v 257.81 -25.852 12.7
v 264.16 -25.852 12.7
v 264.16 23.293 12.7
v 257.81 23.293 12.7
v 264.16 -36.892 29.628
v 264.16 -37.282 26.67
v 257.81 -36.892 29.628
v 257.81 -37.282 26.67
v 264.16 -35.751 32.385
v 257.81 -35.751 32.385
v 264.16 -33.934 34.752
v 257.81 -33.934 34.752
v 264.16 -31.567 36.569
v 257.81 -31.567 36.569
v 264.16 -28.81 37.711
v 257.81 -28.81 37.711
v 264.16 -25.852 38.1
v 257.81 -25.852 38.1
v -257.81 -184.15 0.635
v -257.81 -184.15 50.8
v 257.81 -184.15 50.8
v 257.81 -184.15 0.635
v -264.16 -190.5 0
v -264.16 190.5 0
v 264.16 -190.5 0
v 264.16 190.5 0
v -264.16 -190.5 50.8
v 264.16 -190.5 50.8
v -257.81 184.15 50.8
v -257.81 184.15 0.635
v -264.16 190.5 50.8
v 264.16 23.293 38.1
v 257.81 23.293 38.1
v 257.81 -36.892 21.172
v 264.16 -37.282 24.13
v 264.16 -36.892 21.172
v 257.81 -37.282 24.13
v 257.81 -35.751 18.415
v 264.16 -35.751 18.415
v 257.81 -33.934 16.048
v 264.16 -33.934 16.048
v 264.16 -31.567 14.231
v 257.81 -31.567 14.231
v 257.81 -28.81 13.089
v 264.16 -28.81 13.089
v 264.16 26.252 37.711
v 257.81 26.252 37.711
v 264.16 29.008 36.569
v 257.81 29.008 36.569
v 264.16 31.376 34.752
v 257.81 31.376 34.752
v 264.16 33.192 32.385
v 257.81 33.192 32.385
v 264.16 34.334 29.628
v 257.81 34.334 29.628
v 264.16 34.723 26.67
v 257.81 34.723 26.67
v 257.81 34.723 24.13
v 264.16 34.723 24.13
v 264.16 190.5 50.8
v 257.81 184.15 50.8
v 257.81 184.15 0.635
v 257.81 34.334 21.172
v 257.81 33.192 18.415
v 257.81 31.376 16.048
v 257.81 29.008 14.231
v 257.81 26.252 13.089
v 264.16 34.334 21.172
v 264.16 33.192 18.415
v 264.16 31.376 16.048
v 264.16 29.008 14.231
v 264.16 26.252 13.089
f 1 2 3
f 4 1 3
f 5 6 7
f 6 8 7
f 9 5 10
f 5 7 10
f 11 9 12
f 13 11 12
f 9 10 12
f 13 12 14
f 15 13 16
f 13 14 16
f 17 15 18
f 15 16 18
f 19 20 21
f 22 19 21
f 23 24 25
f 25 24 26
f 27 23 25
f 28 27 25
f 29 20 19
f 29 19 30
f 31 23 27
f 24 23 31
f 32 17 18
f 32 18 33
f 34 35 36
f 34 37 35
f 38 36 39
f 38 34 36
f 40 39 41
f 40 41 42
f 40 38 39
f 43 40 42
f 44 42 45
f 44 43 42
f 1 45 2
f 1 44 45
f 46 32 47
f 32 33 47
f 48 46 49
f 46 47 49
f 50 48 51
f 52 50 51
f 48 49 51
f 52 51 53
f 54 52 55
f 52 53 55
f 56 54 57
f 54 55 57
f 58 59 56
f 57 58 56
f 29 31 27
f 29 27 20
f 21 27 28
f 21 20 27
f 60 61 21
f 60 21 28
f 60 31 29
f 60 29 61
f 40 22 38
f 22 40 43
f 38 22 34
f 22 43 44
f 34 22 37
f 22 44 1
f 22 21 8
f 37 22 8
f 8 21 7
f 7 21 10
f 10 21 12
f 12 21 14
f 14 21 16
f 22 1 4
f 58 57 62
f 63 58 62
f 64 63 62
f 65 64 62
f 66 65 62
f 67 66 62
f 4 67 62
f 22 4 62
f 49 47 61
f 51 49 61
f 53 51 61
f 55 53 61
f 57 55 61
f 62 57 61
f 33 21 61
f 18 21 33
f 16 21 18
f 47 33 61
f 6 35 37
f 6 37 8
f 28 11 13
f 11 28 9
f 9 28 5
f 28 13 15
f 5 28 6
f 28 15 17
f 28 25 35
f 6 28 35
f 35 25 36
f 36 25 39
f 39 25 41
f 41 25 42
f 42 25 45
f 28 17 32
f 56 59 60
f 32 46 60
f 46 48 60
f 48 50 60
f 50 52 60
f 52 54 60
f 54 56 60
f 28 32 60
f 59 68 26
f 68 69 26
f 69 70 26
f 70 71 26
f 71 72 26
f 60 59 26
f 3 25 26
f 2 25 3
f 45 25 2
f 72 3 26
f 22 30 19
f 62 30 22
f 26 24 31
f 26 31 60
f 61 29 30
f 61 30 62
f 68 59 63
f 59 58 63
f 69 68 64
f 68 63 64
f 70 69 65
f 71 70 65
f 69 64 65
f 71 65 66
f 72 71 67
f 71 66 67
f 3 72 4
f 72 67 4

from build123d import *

# Parameters (mm, degrees)
F0_W     = 528.32
F0_H     = 381
F1_DEPTH = 50.8
F2_W     = 515.62
F2_H     = 368.3
F3_DEPTH = 50.165
F4_W     = 72.005392
F4_H     = 25.4
F5_DEPTH = 6.35
F6_R     = 11.43


with BuildPart() as f1:
    # F0 (on Top) → F1 (new body)
    with BuildSketch(Plane.XY):
        Rectangle(F0_W, F0_H)
    extrude(amount=F1_DEPTH)

    # F2 (on face) → F3 (cut)
    with BuildSketch(Plane.XY.offset(50.8)):
        Rectangle(F2_W, F2_H)
    extrude(amount=-F3_DEPTH, mode=Mode.SUBTRACT)

    # F4 (on face) → F5 (cut)
    with BuildSketch(Plane.YZ.offset(264.16)):
        with Locations((-1.279233, 25.4)):
            Rectangle(F4_W, F4_H)
    extrude(amount=-F5_DEPTH, mode=Mode.SUBTRACT)

    # F6
    f6_edges = [f1.edges().sort_by_distance(p)[0] for p in [
        (260.985, 34.723463, 12.7),
        (260.985, -37.281929, 12.7),
        (260.985, -37.281929, 38.1),
        (260.985, 34.723463, 38.1),
    ]]
    fillet(f6_edges, radius=F6_R)


solid = f1.part
